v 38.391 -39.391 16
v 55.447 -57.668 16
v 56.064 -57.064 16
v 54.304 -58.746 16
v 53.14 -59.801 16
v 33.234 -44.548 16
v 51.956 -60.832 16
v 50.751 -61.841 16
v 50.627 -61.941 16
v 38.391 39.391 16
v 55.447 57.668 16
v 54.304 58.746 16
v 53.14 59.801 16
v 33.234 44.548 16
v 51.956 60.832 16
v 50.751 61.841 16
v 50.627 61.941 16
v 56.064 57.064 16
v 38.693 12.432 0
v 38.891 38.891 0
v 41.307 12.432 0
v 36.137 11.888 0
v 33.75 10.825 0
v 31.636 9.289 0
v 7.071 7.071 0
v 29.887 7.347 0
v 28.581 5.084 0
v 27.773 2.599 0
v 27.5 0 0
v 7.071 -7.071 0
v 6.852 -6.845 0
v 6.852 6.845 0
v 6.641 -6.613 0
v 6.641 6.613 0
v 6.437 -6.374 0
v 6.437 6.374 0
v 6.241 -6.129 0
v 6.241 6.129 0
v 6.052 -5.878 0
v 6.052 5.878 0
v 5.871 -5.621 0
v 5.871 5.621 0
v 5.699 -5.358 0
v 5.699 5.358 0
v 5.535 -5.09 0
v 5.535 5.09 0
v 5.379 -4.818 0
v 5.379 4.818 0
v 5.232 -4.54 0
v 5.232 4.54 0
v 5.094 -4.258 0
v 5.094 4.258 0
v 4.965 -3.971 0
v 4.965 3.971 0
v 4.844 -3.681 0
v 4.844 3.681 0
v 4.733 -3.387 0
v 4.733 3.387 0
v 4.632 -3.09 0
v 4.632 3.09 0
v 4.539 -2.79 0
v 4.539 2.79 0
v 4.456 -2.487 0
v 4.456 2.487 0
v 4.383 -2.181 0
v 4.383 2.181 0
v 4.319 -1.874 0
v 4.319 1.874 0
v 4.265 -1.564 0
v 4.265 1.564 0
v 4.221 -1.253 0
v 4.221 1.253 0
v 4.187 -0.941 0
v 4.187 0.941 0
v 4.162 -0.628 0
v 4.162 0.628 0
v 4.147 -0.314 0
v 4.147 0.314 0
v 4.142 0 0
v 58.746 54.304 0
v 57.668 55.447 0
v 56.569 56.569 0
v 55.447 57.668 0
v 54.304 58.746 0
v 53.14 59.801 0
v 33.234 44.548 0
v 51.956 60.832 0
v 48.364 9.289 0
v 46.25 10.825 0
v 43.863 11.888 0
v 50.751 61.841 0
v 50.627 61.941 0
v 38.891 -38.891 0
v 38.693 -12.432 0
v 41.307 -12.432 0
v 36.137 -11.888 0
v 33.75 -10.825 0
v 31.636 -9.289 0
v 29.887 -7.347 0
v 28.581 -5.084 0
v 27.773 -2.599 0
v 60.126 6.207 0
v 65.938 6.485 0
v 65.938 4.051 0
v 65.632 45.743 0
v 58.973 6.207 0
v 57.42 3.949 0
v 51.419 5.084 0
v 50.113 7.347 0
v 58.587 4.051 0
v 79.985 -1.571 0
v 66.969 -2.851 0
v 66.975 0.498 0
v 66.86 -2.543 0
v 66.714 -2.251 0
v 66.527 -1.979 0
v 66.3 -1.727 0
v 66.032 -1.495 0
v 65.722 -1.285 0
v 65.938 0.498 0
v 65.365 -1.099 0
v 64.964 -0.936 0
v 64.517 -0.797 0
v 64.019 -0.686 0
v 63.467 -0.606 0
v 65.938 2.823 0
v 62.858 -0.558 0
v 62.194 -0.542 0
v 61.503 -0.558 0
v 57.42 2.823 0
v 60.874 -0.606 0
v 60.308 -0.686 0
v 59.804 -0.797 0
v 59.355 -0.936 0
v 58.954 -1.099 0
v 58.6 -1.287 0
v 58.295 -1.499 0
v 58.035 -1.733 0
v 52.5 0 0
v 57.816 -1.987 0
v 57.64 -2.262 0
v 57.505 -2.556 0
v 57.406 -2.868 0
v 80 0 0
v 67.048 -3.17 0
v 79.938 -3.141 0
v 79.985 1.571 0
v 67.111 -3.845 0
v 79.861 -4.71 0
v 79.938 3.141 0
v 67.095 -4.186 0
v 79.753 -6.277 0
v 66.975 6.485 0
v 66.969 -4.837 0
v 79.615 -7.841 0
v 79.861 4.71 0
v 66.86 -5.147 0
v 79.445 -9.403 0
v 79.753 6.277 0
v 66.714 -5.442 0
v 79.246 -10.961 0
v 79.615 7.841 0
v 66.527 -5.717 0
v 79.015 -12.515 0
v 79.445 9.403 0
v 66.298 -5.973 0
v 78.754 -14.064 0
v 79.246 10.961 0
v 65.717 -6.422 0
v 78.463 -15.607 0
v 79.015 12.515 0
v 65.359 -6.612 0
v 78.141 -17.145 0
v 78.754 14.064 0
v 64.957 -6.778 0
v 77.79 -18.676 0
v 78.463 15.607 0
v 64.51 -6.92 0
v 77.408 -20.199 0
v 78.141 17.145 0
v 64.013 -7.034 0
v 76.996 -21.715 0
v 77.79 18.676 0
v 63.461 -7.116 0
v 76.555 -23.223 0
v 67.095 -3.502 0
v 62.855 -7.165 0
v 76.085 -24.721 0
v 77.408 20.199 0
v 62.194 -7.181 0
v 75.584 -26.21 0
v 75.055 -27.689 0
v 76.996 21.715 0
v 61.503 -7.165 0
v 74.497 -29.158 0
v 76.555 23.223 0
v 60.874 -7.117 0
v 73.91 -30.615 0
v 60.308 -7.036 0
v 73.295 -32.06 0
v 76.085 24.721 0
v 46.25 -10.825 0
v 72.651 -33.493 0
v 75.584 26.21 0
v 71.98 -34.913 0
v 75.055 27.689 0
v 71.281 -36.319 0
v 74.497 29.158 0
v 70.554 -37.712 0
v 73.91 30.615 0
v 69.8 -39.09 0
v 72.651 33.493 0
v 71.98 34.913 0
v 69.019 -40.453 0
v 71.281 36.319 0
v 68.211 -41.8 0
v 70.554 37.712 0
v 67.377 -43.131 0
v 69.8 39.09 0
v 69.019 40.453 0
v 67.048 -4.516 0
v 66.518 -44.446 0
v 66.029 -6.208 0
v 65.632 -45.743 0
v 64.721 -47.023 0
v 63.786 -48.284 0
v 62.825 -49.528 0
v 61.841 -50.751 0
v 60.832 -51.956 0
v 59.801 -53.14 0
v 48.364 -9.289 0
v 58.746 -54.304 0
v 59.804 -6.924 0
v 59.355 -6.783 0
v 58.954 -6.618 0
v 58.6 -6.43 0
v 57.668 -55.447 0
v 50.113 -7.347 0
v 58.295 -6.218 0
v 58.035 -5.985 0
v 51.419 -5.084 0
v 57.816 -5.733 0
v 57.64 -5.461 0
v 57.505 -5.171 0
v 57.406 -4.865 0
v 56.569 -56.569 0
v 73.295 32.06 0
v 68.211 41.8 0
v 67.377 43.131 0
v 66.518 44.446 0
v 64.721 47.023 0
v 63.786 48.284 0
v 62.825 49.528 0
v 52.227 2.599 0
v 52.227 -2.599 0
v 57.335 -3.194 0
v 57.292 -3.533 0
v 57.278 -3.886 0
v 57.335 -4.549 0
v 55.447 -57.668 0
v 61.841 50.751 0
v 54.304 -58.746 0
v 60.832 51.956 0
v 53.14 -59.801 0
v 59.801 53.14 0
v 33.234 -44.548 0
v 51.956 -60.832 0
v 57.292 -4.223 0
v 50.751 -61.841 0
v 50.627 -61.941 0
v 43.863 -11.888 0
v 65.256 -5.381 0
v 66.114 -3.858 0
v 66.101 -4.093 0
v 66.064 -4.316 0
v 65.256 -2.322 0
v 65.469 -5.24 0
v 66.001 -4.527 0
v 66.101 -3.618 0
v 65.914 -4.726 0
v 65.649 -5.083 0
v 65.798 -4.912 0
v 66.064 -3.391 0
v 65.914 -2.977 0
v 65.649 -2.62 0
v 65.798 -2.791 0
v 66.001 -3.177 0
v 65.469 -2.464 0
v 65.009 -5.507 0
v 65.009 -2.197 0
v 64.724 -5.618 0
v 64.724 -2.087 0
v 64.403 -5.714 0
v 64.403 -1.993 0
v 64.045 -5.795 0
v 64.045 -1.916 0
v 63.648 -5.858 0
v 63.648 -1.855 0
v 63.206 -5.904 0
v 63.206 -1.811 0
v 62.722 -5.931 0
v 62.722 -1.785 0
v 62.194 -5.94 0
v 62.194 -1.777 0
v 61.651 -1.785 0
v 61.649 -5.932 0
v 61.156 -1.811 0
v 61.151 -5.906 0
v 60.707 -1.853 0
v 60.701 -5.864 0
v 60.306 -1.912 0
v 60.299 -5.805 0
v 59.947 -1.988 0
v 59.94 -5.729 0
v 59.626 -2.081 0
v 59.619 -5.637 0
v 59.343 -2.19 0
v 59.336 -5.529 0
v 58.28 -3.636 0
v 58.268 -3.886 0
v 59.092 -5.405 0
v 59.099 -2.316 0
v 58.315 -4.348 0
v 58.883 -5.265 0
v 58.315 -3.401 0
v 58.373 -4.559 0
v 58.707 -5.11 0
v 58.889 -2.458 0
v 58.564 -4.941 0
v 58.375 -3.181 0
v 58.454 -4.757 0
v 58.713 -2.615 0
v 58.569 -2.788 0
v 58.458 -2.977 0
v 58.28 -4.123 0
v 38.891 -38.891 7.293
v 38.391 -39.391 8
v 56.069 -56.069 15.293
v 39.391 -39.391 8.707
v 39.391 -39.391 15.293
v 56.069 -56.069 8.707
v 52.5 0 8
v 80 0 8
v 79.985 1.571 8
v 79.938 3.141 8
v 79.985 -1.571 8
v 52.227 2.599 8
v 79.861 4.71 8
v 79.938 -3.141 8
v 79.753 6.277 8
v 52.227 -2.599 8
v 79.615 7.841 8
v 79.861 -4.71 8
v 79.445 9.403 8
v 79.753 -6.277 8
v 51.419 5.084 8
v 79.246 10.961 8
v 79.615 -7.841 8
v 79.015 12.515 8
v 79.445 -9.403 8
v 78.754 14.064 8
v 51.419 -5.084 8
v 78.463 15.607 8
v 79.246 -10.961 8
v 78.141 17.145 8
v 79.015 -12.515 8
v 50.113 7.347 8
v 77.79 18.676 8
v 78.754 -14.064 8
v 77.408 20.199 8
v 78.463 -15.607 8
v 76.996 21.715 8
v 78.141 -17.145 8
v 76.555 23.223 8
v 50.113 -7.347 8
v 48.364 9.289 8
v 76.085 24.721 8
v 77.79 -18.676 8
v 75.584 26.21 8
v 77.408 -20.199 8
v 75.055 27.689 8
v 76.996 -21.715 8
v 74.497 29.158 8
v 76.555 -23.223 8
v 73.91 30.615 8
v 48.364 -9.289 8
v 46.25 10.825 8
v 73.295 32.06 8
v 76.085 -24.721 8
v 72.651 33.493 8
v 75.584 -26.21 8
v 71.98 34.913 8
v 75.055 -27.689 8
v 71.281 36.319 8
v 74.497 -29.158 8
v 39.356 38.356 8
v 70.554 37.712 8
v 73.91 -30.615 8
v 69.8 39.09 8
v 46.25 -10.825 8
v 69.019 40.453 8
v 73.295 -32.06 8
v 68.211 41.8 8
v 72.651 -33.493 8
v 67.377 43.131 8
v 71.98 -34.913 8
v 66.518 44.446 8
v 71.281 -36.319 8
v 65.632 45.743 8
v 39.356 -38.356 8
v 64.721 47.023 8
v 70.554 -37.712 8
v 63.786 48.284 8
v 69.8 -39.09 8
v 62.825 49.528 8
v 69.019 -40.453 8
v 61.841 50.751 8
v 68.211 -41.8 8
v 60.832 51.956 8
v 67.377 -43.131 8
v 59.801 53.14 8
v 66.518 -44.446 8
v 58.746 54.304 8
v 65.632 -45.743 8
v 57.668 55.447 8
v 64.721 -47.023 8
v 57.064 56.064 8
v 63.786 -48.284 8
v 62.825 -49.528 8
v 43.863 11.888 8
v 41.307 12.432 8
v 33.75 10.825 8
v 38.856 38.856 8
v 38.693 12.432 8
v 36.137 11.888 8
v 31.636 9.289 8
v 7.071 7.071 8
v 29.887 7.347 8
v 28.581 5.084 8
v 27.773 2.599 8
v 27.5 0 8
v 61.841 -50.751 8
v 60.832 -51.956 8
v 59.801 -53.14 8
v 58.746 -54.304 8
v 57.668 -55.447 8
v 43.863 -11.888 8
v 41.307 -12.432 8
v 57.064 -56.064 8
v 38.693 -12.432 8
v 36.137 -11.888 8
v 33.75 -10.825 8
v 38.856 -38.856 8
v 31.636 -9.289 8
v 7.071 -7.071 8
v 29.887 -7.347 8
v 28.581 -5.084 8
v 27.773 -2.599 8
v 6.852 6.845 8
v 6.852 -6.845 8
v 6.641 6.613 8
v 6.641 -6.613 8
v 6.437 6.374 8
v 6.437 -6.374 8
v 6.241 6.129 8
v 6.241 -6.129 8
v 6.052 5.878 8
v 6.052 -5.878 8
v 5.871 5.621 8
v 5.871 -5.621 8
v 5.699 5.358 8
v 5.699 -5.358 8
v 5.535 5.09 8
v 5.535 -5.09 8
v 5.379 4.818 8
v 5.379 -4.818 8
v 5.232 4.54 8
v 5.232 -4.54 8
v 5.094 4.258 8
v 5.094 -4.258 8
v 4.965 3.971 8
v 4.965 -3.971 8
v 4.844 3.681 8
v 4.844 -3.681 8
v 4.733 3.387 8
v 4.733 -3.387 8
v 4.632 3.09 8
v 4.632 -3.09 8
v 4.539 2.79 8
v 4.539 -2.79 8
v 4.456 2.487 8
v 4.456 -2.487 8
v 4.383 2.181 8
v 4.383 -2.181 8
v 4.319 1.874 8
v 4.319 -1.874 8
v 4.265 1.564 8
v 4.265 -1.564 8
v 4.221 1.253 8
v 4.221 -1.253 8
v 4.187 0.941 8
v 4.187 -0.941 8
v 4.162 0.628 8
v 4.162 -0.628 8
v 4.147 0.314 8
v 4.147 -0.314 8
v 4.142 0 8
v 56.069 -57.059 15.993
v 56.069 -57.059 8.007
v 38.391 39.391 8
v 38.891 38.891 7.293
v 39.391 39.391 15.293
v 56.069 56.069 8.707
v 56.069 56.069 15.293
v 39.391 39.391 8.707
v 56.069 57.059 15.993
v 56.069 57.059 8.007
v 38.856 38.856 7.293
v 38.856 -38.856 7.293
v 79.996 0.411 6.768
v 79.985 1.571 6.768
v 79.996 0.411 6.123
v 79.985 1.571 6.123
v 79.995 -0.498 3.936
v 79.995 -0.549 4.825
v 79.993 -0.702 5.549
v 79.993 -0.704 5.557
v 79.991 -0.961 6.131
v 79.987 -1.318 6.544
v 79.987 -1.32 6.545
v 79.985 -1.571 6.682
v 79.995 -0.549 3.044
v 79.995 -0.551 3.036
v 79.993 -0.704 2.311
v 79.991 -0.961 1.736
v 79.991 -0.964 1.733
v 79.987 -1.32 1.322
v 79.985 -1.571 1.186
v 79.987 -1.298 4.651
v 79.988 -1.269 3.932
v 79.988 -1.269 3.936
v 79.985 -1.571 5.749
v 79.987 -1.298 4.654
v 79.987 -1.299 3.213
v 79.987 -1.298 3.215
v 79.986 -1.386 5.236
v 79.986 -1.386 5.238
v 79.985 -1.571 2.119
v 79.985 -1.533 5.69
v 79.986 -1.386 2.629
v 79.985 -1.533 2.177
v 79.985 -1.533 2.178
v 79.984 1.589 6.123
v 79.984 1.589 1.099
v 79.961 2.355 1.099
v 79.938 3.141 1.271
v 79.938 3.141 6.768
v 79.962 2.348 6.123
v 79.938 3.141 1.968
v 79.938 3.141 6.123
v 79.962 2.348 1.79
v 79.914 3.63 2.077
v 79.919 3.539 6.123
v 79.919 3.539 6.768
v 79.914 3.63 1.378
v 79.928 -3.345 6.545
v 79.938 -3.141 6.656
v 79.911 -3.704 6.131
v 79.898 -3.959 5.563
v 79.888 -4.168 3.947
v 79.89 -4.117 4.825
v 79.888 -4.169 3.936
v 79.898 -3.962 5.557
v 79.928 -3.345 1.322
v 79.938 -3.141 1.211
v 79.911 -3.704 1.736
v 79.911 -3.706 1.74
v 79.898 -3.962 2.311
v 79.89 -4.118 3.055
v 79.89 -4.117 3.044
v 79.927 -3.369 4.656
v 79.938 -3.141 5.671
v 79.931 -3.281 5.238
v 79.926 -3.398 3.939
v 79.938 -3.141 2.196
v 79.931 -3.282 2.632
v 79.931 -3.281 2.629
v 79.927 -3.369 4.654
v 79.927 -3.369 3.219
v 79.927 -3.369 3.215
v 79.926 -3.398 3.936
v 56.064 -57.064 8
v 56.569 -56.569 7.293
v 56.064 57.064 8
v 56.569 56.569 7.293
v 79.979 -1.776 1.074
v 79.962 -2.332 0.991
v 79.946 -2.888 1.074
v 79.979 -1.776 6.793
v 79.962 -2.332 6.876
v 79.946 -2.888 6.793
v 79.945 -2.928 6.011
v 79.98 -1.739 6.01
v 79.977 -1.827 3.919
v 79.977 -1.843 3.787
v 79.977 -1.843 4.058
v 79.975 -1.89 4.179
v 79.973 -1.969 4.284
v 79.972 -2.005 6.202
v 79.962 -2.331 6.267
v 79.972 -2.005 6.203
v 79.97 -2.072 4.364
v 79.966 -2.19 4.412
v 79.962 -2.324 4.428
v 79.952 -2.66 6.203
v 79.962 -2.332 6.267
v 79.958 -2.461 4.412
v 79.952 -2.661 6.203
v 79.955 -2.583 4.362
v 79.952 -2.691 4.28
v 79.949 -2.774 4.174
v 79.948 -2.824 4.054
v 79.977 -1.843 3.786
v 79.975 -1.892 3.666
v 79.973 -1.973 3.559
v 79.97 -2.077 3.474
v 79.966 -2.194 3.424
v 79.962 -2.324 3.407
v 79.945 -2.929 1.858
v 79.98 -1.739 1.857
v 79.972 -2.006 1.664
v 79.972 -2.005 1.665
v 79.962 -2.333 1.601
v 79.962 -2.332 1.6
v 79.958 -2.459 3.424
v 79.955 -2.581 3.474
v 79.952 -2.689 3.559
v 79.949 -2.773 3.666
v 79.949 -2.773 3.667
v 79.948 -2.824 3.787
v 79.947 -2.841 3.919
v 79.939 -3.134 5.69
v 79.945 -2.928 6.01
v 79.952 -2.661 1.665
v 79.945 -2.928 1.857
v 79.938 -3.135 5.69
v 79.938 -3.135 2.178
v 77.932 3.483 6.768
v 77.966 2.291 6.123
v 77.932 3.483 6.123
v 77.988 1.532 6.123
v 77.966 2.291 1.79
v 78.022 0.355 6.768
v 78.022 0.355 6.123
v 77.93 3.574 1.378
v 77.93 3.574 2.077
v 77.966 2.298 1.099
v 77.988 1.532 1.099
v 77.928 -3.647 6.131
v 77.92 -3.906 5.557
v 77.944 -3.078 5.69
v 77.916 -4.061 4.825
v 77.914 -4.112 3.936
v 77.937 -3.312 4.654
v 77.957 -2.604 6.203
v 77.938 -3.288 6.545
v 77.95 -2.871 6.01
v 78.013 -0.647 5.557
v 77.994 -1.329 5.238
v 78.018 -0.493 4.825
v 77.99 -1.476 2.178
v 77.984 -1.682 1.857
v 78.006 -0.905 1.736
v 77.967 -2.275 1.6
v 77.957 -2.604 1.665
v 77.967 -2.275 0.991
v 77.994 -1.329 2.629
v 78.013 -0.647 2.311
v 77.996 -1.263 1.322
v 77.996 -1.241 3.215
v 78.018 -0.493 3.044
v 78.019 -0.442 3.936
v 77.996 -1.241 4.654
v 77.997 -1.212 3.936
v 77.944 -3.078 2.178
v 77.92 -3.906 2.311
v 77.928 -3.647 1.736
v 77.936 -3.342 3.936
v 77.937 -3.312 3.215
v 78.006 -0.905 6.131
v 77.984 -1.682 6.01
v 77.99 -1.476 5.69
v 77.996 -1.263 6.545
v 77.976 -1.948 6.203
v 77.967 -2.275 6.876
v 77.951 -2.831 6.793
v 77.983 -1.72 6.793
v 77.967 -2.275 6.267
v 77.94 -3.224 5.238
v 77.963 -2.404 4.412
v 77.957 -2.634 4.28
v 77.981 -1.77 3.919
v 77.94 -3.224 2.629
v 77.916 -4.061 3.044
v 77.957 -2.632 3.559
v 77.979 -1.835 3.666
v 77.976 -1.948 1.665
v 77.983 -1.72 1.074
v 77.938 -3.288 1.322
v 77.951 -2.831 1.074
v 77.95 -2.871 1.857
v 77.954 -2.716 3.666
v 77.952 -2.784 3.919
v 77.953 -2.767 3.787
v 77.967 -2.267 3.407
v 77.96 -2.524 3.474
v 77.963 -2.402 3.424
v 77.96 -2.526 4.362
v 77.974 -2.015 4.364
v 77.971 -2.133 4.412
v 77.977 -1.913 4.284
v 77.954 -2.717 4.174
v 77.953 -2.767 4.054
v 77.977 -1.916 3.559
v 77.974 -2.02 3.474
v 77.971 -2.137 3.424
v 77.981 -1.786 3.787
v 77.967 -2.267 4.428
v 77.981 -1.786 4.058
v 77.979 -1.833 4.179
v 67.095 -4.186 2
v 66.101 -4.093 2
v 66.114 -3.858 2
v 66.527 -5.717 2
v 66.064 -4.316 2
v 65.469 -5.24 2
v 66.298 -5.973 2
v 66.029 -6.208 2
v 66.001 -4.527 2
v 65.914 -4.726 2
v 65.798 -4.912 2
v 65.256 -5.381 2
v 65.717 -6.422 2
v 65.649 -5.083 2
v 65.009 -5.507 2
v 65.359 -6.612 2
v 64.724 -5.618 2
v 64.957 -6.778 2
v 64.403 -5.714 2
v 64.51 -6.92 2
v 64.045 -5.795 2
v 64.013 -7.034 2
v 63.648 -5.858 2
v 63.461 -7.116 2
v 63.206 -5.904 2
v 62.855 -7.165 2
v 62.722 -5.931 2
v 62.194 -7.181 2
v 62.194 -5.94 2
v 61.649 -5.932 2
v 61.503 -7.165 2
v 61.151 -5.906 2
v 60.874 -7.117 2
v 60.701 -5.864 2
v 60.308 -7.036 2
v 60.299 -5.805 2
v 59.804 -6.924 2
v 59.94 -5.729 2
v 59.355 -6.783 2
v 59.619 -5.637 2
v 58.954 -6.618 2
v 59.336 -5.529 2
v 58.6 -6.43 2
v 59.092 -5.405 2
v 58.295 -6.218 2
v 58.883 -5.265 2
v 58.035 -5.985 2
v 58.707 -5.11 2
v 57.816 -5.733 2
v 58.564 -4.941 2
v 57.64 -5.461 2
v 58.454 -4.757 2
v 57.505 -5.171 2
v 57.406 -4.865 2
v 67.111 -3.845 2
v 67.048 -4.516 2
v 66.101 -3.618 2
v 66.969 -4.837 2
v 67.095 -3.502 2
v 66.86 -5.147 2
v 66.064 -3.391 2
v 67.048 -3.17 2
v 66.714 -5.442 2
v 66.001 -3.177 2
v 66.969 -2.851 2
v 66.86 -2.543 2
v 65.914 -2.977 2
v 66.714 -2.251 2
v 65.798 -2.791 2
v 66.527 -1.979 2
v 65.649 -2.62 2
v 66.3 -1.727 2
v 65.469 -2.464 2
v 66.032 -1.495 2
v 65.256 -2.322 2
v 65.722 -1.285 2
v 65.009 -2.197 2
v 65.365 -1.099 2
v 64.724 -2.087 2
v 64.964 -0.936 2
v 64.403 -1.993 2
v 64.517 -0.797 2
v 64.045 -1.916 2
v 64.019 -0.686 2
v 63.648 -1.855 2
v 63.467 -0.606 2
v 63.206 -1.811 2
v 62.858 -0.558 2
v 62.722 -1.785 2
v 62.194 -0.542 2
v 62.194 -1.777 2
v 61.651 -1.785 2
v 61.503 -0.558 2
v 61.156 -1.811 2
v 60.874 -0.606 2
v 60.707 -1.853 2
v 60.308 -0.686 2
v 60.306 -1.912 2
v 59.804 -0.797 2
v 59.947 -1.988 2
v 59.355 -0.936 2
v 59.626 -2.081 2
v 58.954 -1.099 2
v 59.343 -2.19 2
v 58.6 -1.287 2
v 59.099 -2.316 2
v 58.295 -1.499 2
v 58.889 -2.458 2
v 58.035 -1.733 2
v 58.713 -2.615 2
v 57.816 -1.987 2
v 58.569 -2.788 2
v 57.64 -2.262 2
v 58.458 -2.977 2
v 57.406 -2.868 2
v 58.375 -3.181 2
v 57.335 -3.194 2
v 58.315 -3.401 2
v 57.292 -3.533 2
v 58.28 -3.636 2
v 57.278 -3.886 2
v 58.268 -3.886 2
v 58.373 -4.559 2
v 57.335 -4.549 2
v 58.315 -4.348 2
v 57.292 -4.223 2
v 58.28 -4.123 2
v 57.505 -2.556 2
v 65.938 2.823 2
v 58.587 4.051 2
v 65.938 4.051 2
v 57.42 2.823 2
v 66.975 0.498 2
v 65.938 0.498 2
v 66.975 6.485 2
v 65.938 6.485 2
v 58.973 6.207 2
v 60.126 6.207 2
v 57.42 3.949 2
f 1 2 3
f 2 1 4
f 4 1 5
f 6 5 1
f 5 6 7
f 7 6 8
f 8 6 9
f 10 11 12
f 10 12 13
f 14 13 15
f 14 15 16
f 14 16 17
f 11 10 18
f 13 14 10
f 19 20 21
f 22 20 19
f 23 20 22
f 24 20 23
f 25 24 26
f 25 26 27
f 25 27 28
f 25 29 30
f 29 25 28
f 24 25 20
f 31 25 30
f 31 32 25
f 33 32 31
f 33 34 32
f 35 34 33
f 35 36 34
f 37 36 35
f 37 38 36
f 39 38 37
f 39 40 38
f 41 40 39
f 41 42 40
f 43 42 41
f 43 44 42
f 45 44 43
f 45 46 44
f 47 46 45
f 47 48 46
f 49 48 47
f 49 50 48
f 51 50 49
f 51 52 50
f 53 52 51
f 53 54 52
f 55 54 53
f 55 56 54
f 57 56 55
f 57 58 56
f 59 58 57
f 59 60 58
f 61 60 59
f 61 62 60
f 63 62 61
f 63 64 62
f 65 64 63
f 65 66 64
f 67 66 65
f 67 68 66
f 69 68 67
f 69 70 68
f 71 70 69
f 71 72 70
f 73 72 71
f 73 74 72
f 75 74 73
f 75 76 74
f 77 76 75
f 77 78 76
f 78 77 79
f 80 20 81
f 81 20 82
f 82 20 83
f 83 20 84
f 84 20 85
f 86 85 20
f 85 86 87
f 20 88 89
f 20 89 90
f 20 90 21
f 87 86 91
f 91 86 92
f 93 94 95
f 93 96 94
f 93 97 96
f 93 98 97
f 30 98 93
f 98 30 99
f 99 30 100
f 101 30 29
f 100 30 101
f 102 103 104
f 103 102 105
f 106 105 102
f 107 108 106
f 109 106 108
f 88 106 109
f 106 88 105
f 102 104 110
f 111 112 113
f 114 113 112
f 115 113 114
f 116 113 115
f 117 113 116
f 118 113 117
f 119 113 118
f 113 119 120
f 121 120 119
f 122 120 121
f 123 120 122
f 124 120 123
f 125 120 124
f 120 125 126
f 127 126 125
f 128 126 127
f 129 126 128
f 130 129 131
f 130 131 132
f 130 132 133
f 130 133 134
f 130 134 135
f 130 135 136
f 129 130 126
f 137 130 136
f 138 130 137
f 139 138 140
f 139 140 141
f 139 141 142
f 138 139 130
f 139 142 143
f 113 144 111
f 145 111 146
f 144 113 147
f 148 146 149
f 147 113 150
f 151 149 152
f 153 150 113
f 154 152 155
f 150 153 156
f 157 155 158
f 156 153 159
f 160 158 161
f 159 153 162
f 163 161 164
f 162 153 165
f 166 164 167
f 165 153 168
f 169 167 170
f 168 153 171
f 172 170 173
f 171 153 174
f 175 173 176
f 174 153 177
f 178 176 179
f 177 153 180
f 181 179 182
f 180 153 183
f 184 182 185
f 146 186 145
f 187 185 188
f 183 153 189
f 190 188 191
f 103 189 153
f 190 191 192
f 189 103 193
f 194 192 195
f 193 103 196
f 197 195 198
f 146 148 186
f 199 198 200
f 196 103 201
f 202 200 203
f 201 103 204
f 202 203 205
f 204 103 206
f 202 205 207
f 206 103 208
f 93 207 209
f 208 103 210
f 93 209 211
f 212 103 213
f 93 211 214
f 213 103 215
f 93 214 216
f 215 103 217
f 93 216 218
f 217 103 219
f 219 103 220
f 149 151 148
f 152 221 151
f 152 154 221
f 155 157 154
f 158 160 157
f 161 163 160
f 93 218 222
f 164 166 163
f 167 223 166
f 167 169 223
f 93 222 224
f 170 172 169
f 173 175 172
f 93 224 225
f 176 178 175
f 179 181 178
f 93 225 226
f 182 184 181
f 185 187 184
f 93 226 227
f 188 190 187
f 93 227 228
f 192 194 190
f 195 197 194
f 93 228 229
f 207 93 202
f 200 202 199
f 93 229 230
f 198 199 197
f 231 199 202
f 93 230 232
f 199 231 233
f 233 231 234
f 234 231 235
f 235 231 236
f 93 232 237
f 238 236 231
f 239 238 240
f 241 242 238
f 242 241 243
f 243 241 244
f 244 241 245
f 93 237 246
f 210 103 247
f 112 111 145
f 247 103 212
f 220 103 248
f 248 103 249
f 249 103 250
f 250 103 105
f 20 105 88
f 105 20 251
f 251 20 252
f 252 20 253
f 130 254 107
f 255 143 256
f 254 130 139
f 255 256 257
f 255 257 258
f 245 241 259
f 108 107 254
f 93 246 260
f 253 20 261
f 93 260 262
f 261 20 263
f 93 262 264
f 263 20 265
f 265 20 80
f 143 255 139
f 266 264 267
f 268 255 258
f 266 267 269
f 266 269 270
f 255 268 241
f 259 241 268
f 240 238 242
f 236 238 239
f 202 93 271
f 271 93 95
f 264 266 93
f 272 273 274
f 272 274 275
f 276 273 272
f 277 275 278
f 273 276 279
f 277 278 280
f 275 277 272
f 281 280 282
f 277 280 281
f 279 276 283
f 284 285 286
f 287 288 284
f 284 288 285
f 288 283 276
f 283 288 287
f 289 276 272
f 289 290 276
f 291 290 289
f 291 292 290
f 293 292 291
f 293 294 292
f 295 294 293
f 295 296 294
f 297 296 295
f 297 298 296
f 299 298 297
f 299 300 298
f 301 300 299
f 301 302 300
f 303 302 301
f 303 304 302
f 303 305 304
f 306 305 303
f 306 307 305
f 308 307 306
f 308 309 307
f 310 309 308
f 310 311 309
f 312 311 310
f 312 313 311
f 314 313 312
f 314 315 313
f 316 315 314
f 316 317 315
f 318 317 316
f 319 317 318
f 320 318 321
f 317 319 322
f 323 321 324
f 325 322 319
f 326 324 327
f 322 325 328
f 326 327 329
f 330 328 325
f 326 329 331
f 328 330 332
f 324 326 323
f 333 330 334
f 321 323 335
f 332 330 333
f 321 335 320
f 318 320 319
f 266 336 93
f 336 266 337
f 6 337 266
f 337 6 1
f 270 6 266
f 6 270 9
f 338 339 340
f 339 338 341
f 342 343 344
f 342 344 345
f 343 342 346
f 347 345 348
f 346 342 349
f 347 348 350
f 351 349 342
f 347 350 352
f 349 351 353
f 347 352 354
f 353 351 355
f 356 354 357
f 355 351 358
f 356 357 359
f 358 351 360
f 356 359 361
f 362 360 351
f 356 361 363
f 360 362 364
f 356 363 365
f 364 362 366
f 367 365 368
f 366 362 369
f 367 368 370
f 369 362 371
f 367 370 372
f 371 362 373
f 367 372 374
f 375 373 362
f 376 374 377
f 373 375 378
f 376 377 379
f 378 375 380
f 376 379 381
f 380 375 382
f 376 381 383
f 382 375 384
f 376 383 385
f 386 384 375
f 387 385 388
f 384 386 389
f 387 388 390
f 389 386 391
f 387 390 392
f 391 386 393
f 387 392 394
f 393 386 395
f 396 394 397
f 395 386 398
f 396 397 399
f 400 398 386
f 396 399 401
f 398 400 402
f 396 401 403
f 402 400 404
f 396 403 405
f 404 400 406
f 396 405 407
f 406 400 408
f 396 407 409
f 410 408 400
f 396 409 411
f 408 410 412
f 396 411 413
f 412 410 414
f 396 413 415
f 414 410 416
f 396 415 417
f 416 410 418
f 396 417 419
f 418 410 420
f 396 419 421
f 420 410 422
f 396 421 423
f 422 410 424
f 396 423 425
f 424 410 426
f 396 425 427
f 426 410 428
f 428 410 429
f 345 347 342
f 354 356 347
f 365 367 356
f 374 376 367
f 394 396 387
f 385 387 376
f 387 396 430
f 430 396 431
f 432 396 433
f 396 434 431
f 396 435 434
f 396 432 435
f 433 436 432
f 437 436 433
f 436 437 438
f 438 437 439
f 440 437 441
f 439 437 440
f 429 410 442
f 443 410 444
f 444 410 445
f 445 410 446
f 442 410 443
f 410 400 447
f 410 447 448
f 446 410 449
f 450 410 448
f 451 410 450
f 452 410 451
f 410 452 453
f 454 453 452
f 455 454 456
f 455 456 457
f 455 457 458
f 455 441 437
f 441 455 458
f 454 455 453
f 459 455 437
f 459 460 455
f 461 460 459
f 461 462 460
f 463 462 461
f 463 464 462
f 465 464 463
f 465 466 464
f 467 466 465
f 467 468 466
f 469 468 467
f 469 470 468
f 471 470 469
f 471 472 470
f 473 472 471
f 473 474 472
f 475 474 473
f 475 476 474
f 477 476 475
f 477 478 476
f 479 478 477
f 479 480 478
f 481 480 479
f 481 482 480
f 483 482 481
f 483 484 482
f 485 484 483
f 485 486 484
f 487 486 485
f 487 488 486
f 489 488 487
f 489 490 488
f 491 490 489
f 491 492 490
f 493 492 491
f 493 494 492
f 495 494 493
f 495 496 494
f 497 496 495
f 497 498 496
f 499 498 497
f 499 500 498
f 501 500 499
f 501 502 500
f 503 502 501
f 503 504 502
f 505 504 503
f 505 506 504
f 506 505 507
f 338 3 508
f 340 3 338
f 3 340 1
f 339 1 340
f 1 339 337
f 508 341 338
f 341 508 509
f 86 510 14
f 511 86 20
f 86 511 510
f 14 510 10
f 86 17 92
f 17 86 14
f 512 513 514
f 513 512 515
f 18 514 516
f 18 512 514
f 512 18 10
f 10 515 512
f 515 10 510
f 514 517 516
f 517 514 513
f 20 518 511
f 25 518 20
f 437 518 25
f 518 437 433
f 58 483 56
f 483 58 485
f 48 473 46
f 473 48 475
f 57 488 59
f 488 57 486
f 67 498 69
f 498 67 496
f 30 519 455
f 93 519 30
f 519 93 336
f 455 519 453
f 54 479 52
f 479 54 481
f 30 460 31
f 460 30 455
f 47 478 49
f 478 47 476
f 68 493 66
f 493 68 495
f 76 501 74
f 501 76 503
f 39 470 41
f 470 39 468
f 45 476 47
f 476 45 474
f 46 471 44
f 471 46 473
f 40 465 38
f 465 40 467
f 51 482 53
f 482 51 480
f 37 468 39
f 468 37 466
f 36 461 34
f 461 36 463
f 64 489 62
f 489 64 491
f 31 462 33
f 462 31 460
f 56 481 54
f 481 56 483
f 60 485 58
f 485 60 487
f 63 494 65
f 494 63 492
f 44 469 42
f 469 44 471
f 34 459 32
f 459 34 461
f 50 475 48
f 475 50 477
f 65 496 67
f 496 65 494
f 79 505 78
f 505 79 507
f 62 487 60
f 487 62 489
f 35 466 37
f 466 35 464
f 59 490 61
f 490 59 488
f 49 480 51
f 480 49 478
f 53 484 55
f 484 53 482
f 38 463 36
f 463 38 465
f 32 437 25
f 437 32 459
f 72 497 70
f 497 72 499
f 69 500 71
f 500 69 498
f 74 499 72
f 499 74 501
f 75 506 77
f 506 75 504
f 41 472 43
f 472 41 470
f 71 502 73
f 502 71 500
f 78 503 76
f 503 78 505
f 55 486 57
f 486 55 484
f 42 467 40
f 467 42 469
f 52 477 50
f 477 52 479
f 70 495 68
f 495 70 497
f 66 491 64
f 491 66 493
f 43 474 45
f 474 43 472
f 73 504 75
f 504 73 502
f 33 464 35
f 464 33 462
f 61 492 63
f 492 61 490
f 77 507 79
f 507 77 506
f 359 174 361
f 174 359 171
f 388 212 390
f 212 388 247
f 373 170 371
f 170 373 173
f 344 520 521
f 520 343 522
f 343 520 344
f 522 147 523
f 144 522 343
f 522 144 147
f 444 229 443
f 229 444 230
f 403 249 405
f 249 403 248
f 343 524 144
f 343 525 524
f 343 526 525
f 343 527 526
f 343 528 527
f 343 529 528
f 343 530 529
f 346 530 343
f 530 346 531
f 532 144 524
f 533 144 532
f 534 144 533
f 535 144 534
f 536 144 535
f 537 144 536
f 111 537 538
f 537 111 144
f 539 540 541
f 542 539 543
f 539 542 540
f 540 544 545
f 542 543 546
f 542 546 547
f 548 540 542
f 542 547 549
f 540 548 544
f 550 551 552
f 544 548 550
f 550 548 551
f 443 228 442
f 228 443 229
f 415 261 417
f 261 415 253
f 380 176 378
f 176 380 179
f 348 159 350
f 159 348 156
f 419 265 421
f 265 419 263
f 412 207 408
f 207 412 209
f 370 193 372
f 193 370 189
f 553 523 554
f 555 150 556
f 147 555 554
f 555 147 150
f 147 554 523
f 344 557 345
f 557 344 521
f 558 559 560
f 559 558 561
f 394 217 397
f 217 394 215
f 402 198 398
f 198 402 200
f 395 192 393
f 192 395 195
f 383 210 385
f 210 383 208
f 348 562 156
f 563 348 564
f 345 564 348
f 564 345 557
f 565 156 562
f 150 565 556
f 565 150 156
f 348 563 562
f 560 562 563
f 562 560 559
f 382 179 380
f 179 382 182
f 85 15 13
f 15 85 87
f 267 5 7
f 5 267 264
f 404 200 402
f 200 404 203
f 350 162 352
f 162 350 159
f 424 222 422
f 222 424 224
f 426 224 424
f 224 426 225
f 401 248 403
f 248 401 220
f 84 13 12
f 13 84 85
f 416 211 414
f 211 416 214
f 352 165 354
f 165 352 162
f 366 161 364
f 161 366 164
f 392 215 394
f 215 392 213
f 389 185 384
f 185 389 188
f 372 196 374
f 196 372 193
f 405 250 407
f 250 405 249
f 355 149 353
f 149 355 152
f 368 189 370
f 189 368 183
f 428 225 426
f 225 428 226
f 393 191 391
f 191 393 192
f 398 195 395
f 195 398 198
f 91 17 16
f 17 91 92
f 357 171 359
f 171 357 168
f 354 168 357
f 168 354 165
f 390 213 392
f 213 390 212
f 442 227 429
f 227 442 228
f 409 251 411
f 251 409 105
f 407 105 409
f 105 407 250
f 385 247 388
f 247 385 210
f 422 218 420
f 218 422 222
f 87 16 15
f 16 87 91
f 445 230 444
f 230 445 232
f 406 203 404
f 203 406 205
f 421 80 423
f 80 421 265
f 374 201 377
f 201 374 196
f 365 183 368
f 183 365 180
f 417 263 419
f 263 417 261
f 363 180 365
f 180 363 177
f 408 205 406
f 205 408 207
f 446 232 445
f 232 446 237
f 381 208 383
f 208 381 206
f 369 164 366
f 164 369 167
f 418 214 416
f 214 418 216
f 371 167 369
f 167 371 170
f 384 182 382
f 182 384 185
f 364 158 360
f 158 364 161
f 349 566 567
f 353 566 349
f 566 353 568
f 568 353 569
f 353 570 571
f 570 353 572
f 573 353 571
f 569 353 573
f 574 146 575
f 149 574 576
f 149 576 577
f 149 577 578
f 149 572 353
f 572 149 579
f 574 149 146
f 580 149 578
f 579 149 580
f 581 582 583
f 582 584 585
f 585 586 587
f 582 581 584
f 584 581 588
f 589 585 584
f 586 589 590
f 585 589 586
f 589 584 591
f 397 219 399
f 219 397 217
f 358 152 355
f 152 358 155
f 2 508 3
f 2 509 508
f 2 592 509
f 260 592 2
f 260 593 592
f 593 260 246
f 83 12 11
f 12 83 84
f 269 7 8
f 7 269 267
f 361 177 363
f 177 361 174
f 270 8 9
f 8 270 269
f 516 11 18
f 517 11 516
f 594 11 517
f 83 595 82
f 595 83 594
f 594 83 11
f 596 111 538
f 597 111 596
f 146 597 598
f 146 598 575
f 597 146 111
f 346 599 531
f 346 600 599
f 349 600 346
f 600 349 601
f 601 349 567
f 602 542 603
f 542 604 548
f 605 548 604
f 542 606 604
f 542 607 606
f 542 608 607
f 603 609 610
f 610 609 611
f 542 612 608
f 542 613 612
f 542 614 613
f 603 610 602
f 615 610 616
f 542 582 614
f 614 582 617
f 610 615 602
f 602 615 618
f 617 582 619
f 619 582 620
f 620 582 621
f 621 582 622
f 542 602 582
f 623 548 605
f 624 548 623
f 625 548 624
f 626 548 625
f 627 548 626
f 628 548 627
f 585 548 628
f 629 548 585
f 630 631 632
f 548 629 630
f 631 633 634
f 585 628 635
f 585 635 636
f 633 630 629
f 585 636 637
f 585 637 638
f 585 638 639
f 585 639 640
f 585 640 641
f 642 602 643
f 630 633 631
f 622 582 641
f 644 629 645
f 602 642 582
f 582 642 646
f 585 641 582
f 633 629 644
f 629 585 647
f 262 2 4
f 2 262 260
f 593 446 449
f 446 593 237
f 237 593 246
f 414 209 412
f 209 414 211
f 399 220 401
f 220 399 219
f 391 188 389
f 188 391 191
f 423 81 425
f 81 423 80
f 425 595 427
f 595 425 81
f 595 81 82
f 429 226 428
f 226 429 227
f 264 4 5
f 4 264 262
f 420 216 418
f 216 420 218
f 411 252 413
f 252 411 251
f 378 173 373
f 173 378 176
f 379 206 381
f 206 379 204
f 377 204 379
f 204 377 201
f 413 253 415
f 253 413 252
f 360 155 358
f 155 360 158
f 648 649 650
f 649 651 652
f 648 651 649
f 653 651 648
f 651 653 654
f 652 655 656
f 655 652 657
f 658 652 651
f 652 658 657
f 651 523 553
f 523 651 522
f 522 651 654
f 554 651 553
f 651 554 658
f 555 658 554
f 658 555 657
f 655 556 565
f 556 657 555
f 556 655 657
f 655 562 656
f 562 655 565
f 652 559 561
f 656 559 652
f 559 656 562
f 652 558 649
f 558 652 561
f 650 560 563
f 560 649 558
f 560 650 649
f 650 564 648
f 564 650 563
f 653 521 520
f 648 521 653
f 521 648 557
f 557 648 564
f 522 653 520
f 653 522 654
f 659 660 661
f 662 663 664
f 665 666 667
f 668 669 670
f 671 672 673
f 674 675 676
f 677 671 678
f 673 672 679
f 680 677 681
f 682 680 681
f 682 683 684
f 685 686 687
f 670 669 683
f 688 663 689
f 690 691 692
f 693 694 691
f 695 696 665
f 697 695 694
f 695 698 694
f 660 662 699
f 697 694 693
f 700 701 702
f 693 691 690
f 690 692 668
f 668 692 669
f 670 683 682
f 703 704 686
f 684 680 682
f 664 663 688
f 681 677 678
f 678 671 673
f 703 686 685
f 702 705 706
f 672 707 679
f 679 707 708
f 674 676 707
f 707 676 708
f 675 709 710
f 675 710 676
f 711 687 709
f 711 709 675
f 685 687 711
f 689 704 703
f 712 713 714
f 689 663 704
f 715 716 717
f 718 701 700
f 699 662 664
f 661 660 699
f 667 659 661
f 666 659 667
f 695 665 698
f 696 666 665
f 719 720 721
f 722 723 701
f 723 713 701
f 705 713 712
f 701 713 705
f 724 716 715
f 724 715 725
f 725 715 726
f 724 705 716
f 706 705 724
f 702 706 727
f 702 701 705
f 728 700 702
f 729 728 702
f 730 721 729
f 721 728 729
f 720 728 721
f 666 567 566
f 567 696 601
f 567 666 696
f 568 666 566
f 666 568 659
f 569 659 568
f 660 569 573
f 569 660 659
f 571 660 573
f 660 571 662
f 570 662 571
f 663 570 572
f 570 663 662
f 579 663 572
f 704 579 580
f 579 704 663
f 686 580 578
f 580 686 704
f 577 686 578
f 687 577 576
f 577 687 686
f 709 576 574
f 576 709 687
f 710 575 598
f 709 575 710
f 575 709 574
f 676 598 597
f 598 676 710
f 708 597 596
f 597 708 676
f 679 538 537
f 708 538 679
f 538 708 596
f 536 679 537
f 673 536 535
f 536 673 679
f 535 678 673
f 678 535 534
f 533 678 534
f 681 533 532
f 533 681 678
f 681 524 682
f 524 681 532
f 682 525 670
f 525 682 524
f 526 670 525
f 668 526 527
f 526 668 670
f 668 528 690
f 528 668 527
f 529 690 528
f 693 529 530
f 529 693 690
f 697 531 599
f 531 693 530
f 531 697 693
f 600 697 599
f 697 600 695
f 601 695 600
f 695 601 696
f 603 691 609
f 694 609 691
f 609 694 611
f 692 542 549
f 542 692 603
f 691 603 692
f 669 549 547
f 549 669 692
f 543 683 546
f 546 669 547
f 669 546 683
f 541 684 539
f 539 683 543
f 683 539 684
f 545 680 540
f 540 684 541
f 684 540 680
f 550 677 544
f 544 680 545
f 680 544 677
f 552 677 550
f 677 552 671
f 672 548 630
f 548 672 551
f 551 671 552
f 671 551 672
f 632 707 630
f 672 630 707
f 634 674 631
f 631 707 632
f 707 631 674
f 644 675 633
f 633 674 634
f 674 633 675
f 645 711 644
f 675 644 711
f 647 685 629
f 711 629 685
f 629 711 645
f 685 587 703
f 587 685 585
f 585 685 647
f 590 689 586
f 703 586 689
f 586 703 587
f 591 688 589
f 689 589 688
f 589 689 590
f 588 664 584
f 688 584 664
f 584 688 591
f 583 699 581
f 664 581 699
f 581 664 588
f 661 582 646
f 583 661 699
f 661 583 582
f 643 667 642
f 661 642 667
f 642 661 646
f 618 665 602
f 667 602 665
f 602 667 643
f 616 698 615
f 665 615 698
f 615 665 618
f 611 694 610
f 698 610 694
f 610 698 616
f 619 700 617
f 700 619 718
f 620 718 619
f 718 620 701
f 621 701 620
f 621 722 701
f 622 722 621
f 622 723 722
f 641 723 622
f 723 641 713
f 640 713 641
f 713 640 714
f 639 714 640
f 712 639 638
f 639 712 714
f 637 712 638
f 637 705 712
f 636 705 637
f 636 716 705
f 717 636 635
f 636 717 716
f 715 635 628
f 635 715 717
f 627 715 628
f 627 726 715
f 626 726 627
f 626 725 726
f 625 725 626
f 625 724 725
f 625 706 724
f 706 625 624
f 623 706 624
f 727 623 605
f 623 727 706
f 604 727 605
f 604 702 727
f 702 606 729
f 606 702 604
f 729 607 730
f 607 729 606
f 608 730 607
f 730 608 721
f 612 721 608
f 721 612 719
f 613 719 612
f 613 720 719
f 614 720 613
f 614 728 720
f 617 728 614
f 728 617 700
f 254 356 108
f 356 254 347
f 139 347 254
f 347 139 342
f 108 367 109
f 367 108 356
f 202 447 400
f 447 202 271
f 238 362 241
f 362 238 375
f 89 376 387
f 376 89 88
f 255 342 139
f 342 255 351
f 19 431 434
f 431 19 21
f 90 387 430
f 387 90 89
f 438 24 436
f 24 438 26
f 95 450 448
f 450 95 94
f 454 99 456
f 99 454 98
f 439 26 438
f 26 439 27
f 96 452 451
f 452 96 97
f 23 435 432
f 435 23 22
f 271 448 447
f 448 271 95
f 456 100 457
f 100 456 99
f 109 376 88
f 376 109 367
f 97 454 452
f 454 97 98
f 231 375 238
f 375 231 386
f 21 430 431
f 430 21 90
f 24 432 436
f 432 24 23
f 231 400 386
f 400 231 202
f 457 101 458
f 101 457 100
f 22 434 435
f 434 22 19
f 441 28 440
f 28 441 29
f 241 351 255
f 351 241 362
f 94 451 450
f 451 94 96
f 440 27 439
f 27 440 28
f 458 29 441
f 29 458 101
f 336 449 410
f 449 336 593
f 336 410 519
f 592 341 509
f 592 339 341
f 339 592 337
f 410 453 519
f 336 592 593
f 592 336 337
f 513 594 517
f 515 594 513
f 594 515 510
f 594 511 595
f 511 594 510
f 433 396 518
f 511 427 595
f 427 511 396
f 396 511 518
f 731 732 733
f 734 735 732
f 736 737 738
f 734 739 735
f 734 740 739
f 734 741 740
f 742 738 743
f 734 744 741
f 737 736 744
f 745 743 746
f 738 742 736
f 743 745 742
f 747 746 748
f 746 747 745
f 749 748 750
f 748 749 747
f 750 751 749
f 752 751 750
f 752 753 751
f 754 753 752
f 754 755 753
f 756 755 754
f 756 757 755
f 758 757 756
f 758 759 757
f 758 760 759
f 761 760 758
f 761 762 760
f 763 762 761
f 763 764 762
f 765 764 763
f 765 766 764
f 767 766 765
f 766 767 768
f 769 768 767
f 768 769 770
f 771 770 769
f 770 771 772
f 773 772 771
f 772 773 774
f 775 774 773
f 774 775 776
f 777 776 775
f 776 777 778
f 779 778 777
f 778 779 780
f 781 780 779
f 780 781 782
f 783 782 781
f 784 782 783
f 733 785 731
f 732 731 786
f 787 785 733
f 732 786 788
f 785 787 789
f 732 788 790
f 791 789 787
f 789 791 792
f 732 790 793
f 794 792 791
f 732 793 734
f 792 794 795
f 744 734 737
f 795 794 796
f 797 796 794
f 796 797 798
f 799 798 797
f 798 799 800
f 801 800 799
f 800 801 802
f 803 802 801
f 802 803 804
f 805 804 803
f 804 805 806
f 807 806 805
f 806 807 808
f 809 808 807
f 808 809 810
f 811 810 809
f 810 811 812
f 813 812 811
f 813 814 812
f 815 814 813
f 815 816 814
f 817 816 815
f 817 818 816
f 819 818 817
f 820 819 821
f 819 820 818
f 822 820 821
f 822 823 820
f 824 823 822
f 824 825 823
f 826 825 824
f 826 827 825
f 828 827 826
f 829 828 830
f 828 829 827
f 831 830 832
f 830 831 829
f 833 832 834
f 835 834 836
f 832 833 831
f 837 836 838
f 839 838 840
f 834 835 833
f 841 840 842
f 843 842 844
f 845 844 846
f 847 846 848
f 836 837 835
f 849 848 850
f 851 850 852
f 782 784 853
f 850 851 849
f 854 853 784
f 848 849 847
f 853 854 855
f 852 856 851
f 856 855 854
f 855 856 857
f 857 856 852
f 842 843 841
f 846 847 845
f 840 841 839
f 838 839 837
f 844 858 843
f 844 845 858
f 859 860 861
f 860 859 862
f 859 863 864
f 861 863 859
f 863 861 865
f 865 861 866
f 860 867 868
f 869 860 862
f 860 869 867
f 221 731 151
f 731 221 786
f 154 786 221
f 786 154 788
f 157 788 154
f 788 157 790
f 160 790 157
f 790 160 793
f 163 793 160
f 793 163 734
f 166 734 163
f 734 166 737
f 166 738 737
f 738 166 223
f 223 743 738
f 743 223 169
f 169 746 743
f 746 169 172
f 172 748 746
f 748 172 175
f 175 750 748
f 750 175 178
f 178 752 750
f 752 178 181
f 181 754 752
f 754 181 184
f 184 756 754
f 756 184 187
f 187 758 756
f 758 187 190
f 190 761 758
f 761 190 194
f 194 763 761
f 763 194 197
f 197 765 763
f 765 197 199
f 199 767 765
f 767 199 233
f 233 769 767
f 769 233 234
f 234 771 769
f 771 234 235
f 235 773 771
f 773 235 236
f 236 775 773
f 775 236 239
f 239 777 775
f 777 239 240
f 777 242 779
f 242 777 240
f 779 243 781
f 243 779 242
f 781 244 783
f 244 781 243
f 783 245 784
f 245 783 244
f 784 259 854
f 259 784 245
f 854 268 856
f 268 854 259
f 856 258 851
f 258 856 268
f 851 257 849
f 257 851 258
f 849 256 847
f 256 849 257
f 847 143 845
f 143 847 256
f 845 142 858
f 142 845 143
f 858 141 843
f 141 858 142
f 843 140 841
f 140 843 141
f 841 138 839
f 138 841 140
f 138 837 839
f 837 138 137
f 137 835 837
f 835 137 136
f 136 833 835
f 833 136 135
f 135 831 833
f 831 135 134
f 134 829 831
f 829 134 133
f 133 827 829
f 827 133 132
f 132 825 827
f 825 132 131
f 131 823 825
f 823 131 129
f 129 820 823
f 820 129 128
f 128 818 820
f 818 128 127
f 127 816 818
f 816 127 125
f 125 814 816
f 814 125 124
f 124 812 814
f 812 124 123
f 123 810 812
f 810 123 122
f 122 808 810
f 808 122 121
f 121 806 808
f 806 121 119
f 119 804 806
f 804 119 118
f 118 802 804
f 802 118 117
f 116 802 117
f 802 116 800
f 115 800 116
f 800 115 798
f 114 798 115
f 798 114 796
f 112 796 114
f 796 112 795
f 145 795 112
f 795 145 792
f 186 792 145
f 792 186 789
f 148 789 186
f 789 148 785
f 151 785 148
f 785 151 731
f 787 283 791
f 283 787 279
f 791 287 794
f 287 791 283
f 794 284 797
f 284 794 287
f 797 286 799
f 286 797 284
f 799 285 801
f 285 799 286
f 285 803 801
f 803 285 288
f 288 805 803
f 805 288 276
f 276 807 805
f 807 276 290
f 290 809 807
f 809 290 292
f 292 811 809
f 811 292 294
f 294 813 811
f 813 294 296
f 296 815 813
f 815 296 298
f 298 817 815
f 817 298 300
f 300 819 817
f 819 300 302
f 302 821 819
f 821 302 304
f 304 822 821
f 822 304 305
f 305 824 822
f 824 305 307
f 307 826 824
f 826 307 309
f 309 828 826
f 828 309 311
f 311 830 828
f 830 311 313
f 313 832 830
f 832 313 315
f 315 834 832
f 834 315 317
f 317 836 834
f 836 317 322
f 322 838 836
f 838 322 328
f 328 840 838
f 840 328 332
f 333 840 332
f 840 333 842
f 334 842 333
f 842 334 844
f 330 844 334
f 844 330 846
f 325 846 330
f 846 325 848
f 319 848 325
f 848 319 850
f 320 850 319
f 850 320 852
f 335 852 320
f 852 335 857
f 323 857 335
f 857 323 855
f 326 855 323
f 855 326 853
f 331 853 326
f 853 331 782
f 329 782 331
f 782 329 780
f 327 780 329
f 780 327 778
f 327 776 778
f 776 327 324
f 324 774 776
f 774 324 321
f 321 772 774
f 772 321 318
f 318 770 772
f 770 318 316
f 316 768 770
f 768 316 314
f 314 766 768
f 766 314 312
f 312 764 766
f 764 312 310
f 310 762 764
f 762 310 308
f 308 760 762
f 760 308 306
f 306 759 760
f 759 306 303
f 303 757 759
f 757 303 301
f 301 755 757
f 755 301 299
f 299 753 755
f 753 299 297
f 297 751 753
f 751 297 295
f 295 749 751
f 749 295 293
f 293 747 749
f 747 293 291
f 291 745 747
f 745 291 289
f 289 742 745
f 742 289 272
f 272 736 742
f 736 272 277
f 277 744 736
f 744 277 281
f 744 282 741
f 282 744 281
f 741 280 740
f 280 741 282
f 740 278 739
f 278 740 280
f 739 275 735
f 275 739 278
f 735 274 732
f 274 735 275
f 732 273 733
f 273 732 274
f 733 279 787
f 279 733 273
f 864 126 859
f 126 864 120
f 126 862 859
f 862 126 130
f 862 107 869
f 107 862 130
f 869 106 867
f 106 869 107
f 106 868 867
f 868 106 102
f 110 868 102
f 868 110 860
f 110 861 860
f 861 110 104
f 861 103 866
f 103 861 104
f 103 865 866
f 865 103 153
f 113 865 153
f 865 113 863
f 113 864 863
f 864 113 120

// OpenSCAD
corner_angle = 90;
radius = 10; 

//edge length
e = 80;//[50:150]
//height of base plate
h = 8; //[5:15]
// fence height
dz = 8; // [1:20]
//fence length
cl = 25; //[10:50]
//fence thickness
cw = 8; //[1:15]
//dimension of dust groove
cc = 1;   //[0:0.2:2]
//grabber diameter
d_grabber = 25; //[0:50]
//grabber offset
grabber_off = 0; //[-30:30]


////// internal values ///////
a = e - radius;
alpha = corner_angle/2;
beta = 90-alpha;
mx = radius/sin(alpha);
my = 0+0;
br = e+0;
grbpos = br/2+grabber_off;

//debugging stuff
/*
color([0,0,0])translate([mx,my,0])cylinder(r=0.3,h=50);
color([0,0,0])translate([mx,0,h])rotate([0,0,corner_angle/2])cube([.4,100,.2],center=true);
color([0,0,0])translate([mx,0,h])rotate([0,0,-corner_angle/2])cube([.4,100,.2],center=true);
*/

difference(){
    intersection() {
        union(){
            hull(){
                translate([mx,my,0])
                    #cylinder(r=radius,h=h,$fn=radius*20);
                
                //outer straight edges
                //translate([mx-cos(beta)*radius,-sin(beta)*radius,0])
                    rotate([0,0,-alpha])
                    //translate([0,0,0])
                    translate([br,0,0])
                    cube([2*a,1,h]);
                //translate([mx-cos(beta)*radius,sin(beta)*radius,0])
                    rotate([0,0,alpha])
                    translate([br,-1,0])
                    cube([2*a,1,h]);
                //for the shape
                translate([mx,-0.5,0])
                    cube([2*a,1,h]);
            }
            //fences
            rotate([0,0,-alpha])
                translate([br-cl,0,0])
                mirror([0,1,0])
                fence();
            rotate([0,0,alpha])
                translate([br-cl,0,0])
                fence();
            
        }
        //outer boundary
        cylinder(r=br,h=h+dz,$fn=4*br);
    }
    
    //grabber
    translate([grbpos,0,0])
        cylinder(r=d_grabber/2,h=h);
    
    //dust grooves
    rotate([0,0,-alpha])
        translate([br-cl/2,0,h])
        rotate([45,0,0])
        cube([cl+0.1,cc,cc],center=true);
    rotate([0,0,alpha])
        translate([br-cl/2,0,h])
        rotate([45,0,0])
        cube([cl+0.1,cc,cc],center=true);
    
    
    //text
    translate([grbpos+d_grabber/2+5,0,0])rotate([0,0,90])
        mirror()
        linear_extrude(height=2)
        text(str(radius), font = "Liberation Sans",valign="top",halign="center",size=10);

    //letter width
    lw = 0.7*h*0.814;
    //angle of single letter
    la = 2*asin(lw/(2*br));
    ll = len(str(radius));
    rotate([0,0,ll/2*la-la/2])
    for(i=[0:1:ll-1]) {
        rotate([0,0,-la*i])
        translate([br,0,h/2])
        rotate([0,-90,0])
        rotate([0,0,90])
        mirror()
        linear_extrude(height=2)
        #text(str(radius)[i], font = "Monospace",halign="center", valign="center",size=0.7*h);
    }
    
}

module fence(){
    difference(){
        union(){
            cube([cl,cw,h+dz]);
            translate([0,-2,0])cube([cl,cw+2,h]);
        }
        translate([cl/2,0,h+dz])
            rotate([45,0,0])
            cube([cl,1,1],center=true);
        
        translate([0,0,h+dz/2])
            rotate([0,0,45])
            cube([1,1,dz],center=true);
        
        translate([cl,0,h+dz/2])
            rotate([0,0,45])
            cube([1,1,dz],center=true);
    }
}
